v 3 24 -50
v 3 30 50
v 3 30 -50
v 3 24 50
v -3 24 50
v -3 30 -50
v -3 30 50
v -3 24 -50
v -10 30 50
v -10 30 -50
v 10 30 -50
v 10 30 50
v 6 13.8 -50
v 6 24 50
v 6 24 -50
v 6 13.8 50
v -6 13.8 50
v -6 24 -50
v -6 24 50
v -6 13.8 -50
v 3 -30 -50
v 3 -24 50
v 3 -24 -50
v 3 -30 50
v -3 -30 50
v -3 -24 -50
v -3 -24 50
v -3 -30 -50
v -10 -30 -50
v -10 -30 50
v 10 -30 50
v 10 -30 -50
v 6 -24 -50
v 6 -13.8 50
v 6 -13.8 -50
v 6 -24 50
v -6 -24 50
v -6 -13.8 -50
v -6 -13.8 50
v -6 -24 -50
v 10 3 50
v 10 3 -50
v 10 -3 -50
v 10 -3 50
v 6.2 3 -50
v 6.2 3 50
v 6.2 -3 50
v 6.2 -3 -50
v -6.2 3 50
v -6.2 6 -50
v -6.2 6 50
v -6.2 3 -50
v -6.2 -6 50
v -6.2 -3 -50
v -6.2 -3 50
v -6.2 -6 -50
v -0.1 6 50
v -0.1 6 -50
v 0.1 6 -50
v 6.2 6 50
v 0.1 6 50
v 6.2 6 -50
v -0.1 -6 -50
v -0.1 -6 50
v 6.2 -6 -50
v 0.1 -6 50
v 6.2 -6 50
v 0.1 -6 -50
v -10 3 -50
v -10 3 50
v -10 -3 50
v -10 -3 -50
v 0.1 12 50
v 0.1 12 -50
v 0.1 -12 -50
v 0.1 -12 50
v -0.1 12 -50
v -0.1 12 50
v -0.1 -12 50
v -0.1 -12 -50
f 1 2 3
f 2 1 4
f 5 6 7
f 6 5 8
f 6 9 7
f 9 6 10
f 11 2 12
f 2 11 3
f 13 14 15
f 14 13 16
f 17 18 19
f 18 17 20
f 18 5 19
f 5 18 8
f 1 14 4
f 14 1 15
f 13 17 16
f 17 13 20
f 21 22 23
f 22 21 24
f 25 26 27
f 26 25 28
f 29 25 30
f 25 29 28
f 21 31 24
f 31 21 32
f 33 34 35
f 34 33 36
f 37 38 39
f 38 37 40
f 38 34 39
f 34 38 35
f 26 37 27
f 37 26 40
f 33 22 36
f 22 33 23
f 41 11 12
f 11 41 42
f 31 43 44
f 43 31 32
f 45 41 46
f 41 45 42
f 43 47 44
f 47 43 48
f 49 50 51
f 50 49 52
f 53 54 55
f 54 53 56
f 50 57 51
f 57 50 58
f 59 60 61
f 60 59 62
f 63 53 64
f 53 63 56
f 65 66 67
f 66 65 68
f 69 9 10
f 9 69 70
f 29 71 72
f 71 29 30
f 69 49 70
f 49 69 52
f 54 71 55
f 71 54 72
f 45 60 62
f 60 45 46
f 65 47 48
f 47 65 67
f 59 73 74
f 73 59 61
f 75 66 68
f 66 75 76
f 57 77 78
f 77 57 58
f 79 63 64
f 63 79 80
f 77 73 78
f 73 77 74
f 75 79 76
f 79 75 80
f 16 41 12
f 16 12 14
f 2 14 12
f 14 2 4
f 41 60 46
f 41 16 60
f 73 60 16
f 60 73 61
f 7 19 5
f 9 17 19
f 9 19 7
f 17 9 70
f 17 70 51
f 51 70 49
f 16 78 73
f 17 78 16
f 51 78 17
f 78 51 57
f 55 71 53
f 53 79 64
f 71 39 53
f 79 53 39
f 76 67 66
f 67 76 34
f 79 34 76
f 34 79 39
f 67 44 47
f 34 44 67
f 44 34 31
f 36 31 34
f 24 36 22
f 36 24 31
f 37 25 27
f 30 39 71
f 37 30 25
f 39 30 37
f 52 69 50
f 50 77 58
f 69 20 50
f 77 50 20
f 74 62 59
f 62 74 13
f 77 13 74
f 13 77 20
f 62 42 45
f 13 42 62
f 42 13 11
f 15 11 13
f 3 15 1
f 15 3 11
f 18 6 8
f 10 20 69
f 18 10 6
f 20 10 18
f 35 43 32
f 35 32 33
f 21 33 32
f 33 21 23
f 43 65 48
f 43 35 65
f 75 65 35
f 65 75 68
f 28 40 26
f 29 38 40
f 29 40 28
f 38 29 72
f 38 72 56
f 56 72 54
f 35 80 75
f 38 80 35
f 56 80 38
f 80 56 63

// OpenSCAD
// 20x60 aluminium extrusion profile, 100mm long (single connected solid)

// ---------- Parameters ----------
profile_width_mm  = 20.0;   // X
profile_height_mm = 60.0;   // Y
length_mm         = 100.0;  // Z

wall_thickness_mm = 2.0;

// T-slot geometry (approximate 20-series look)
slot_opening_mm       = 6.0;    // mouth width at outer face
slot_depth_mm         = 6.0;    // depth from outer face to cavity start
slot_cavity_width_mm  = 12.0;   // internal cavity width behind mouth
slot_cavity_depth_mm  = 10.0;   // cavity depth inward from mouth end

center_bore_diameter_mm = 6.0;

overlap_mm = 0.2; // small overlap for robust booleans
$fn = 64;

// ---------- Helpers ----------
module tslot_cut_x(side=1, len=length_mm) { // side: +1 right, -1 left
    // Mouth (narrow)
    translate([ side*(profile_width_mm/2 - (slot_depth_mm + overlap_mm)/2), 0, 0 ])
        cube([slot_depth_mm + overlap_mm, slot_opening_mm, len + 2*overlap_mm], center=true);

    // Cavity (wide) behind mouth
    translate([ side*(profile_width_mm/2 - slot_depth_mm - (slot_cavity_depth_mm + overlap_mm)/2), 0, 0 ])
        cube([slot_cavity_depth_mm + overlap_mm, slot_cavity_width_mm, len + 2*overlap_mm], center=true);
}

module tslot_cut_y(side=1, len=length_mm) { // side: +1 top, -1 bottom
    // Mouth (narrow)
    translate([ 0, side*(profile_height_mm/2 - (slot_depth_mm + overlap_mm)/2), 0 ])
        cube([slot_opening_mm, slot_depth_mm + overlap_mm, len + 2*overlap_mm], center=true);

    // Cavity (wide) behind mouth
    translate([ 0, side*(profile_height_mm/2 - slot_depth_mm - (slot_cavity_depth_mm + overlap_mm)/2), 0 ])
        cube([slot_cavity_width_mm, slot_cavity_depth_mm + overlap_mm, len + 2*overlap_mm], center=true);
}

// ---------- Main extrusion ----------
module extrusion_20x60(len=length_mm) {
    // Keep a continuous outer ring and leave internal material so the part stays ONE connected solid.
    inner_w = max(0.1, profile_width_mm  - 2*wall_thickness_mm);
    inner_h = max(0.1, profile_height_mm - 2*wall_thickness_mm);

    // Prevent the internal pocket from breaking into the slot cavities:
    // leave a "web" thickness between pocket and the slot cavity inner edge.
    web_mm = 2.0;

    // Slot cavity inner edge from center:
    // x/y position of cavity inner face = profile/2 - slot_depth - slot_cavity_depth
    cavity_inner_x = profile_width_mm/2  - slot_depth_mm - slot_cavity_depth_mm;
    cavity_inner_y = profile_height_mm/2 - slot_depth_mm - slot_cavity_depth_mm;

    // Pocket half-size must be <= cavity_inner - web
    pocket_half_w = min(inner_w/2, max(0.1, cavity_inner_x - web_mm));
    pocket_half_h = min(inner_h/2, max(0.1, cavity_inner_y - web_mm));

    pocket_w = 2*pocket_half_w;
    pocket_h = 2*pocket_half_h;

    color("Silver")
    difference() {
        // Outer envelope (20 x 60 x 100)
        cube([profile_width_mm, profile_height_mm, len], center=true);

        // Subtractions
        union() {
            // T-slots on all four faces
            tslot_cut_y(+1, len);
            tslot_cut_y(-1, len);
            tslot_cut_x(+1, len);
            tslot_cut_x(-1, len);

            // Center bore
            cylinder(d=center_bore_diameter_mm, h=len + 2*overlap_mm, center=true);

            // Internal lightening pocket (kept smaller so it doesn't merge with slots)
            cube([pocket_w, pocket_h, len + 2*overlap_mm], center=true);
        }
    }
}

// ---------- Build ----------
extrusion_20x60(length_mm);
